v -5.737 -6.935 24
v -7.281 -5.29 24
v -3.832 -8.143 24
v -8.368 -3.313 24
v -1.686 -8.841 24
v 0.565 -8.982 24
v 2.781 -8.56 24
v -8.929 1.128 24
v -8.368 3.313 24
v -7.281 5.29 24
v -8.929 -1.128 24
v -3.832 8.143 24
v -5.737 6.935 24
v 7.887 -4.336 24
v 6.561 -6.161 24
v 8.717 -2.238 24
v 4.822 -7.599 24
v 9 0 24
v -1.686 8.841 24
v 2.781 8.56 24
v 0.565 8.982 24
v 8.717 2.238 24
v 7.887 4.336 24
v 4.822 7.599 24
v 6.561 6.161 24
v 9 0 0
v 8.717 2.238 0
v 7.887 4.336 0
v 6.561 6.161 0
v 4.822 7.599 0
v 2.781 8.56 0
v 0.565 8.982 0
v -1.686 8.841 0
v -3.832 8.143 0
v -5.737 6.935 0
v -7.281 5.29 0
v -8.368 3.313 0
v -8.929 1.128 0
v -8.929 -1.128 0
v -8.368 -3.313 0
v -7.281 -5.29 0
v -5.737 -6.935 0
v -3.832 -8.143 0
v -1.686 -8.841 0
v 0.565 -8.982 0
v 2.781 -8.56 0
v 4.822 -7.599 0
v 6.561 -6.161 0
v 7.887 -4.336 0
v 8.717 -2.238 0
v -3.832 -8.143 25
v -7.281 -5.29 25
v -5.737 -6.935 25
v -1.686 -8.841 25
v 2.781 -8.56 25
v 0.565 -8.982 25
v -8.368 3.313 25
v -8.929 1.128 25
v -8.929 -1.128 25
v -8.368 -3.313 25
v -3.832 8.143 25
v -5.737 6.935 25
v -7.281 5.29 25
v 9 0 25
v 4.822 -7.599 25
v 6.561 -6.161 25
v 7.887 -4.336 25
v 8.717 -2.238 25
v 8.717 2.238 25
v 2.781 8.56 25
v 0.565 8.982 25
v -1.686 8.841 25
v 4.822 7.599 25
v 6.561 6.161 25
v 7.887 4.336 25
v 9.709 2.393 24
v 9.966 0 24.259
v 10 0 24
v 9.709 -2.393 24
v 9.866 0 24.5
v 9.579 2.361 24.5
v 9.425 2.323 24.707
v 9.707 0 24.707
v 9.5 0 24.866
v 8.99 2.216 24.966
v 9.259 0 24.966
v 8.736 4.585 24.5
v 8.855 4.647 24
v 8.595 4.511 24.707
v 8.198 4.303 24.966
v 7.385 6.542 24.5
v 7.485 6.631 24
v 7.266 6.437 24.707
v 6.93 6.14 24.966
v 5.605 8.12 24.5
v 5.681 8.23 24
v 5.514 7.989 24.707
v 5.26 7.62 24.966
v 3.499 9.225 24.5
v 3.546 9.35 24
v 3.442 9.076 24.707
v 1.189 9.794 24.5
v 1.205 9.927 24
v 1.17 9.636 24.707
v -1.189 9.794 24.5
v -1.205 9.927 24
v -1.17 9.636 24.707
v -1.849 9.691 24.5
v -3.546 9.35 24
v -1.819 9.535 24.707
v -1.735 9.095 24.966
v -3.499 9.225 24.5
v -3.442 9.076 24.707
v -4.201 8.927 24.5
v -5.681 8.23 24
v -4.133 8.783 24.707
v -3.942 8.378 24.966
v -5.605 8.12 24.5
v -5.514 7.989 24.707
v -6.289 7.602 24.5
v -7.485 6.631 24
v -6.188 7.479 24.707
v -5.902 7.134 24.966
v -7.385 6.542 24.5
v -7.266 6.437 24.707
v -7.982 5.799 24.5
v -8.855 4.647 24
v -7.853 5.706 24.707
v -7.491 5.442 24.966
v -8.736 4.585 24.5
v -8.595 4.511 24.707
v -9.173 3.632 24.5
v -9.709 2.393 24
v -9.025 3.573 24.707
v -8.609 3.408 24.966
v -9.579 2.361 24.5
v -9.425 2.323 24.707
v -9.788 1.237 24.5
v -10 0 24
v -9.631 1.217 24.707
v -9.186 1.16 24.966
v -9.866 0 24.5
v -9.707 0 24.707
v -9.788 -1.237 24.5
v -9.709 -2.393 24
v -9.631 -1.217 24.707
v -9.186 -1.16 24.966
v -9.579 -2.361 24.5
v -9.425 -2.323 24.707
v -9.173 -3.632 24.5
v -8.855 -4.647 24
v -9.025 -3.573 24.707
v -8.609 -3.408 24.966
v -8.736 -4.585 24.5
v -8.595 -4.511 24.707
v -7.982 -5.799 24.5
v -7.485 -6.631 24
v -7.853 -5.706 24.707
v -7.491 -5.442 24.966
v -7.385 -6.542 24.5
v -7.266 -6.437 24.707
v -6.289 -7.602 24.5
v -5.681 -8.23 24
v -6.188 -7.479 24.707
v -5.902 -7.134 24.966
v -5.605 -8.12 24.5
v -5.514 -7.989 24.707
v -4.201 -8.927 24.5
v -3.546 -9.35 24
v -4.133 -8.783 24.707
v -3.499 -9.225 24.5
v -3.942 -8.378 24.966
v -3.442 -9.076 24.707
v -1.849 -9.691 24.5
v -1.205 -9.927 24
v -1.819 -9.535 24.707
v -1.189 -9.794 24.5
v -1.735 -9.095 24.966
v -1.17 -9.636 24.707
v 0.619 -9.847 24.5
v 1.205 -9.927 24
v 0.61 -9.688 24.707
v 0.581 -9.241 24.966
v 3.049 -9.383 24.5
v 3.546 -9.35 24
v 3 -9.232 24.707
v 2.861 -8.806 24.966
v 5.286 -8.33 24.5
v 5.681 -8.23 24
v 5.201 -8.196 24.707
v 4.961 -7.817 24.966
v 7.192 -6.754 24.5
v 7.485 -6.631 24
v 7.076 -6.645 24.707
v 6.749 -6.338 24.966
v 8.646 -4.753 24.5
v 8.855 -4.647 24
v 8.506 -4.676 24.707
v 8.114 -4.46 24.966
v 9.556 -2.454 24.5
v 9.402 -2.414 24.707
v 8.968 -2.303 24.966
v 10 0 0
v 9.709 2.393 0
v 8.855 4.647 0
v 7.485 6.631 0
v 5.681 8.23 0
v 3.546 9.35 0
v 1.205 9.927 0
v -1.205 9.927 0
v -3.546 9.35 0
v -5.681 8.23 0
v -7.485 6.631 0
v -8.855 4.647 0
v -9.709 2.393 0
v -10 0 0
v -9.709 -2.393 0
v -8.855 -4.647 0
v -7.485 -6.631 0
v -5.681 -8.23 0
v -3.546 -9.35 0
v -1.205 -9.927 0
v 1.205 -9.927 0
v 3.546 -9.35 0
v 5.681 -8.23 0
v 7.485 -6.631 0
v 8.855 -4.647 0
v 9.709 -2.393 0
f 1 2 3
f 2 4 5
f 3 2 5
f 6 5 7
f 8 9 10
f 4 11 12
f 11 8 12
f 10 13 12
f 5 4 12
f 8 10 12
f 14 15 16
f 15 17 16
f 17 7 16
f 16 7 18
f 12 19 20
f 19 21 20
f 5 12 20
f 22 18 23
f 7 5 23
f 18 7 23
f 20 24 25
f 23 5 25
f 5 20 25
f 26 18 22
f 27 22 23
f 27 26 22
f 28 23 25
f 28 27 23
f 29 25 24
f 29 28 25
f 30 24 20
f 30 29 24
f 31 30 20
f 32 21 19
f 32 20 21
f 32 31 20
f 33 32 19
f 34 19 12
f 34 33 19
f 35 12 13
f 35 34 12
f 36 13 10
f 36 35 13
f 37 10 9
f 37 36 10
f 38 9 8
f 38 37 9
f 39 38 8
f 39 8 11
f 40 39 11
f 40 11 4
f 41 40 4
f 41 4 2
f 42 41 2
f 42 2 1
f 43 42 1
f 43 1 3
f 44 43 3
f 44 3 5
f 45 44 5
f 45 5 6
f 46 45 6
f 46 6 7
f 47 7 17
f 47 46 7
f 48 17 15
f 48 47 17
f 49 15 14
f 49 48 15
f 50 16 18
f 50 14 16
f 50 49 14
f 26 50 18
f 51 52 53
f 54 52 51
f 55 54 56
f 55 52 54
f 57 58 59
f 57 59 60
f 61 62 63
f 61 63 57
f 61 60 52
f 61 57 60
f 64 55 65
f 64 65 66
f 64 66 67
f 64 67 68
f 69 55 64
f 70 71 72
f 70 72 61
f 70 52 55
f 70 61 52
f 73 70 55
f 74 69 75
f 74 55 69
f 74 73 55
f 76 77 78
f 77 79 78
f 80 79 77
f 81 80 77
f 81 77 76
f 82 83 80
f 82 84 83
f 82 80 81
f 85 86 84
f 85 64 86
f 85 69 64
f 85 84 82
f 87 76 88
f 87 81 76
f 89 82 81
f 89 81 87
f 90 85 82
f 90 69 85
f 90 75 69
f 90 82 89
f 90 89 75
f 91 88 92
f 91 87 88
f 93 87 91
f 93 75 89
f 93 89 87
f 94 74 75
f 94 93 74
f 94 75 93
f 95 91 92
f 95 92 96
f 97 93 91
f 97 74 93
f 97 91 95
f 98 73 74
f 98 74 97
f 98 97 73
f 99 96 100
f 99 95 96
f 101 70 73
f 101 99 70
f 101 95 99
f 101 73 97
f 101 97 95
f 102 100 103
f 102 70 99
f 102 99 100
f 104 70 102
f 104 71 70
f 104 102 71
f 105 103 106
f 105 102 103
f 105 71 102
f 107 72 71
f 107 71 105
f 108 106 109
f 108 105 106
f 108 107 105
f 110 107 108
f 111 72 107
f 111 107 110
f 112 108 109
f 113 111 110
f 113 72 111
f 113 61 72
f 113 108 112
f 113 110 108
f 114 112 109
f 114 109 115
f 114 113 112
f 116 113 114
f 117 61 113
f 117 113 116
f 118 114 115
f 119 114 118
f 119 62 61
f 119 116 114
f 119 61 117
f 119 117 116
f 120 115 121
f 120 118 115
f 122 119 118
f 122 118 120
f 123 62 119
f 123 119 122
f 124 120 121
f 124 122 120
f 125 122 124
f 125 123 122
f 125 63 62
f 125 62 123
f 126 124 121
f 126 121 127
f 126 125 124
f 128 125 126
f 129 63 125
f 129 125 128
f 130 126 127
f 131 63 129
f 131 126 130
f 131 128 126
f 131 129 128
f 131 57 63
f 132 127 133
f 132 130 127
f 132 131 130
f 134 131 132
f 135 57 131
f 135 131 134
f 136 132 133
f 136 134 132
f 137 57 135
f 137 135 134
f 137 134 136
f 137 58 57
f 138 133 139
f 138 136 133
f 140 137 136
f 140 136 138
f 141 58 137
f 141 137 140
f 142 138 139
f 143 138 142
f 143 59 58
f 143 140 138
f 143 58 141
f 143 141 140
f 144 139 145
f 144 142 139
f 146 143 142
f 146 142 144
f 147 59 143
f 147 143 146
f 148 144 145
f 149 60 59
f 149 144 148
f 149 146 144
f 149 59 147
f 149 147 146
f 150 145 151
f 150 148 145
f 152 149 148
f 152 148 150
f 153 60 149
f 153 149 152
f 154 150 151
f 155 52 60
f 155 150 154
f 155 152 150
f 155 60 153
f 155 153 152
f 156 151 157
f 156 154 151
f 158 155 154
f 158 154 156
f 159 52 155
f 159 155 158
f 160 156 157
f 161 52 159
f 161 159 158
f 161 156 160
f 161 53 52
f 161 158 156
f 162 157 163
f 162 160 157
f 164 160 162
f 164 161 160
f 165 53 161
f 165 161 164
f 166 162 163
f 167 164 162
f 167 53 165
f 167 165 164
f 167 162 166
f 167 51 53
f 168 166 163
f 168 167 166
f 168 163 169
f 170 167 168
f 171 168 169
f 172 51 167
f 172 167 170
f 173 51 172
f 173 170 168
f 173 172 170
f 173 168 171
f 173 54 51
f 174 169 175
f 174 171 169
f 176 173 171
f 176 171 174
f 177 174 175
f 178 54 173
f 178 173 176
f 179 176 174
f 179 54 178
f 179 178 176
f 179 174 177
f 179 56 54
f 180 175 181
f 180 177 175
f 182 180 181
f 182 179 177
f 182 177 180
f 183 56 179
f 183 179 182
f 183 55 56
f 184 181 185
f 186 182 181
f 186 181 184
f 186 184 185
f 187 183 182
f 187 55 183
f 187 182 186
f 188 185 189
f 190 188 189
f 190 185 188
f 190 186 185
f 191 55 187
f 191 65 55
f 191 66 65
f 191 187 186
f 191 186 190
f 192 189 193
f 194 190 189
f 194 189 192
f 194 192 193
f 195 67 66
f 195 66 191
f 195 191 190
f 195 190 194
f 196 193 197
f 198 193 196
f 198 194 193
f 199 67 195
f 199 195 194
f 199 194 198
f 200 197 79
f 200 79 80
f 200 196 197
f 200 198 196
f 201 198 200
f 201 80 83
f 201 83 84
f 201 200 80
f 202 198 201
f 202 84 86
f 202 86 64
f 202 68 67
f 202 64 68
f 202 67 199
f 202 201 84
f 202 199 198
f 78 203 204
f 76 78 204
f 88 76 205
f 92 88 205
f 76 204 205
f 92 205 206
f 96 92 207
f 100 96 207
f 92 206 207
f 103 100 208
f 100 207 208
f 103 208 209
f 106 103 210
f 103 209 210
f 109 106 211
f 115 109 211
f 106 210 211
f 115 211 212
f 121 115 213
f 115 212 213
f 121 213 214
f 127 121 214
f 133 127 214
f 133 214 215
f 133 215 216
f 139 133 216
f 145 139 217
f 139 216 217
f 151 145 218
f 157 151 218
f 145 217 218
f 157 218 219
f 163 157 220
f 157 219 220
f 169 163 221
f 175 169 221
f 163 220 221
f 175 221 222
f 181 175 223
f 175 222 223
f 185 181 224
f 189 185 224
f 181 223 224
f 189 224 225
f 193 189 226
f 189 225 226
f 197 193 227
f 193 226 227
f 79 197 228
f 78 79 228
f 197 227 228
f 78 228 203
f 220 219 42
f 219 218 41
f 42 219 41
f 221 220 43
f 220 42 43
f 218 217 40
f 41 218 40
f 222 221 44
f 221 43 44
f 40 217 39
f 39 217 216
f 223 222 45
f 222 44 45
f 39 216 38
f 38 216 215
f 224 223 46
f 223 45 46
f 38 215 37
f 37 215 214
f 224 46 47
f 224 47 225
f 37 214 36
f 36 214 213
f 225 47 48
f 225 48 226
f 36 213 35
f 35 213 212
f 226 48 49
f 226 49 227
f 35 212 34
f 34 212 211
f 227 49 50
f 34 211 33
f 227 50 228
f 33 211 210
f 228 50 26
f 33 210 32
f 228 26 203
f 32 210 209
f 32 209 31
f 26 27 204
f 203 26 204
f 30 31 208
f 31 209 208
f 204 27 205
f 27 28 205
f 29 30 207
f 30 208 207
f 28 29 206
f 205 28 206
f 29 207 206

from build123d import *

# Parameters (mm, degrees)
F0_R     = 10
F1_DEPTH = 25
F2_T     = -1
F3_R     = 1


with BuildPart() as f1:
    # F0 (on Top) → F1 (new body)
    with BuildSketch(Plane.XY):
        Circle(F0_R)
    extrude(amount=F1_DEPTH)

    # F2
    f2_openings = [f1.faces().sort_by_distance(p)[0] for p in [
        (0, 0, 0),
    ]]
    offset(amount=F2_T, openings=f2_openings)

    # F3
    f3_edges = [f1.edges().sort_by_distance(p)[0] for p in [
        (-10, 0, 25),
    ]]
    fillet(f3_edges, radius=F3_R)


solid = f1.part
